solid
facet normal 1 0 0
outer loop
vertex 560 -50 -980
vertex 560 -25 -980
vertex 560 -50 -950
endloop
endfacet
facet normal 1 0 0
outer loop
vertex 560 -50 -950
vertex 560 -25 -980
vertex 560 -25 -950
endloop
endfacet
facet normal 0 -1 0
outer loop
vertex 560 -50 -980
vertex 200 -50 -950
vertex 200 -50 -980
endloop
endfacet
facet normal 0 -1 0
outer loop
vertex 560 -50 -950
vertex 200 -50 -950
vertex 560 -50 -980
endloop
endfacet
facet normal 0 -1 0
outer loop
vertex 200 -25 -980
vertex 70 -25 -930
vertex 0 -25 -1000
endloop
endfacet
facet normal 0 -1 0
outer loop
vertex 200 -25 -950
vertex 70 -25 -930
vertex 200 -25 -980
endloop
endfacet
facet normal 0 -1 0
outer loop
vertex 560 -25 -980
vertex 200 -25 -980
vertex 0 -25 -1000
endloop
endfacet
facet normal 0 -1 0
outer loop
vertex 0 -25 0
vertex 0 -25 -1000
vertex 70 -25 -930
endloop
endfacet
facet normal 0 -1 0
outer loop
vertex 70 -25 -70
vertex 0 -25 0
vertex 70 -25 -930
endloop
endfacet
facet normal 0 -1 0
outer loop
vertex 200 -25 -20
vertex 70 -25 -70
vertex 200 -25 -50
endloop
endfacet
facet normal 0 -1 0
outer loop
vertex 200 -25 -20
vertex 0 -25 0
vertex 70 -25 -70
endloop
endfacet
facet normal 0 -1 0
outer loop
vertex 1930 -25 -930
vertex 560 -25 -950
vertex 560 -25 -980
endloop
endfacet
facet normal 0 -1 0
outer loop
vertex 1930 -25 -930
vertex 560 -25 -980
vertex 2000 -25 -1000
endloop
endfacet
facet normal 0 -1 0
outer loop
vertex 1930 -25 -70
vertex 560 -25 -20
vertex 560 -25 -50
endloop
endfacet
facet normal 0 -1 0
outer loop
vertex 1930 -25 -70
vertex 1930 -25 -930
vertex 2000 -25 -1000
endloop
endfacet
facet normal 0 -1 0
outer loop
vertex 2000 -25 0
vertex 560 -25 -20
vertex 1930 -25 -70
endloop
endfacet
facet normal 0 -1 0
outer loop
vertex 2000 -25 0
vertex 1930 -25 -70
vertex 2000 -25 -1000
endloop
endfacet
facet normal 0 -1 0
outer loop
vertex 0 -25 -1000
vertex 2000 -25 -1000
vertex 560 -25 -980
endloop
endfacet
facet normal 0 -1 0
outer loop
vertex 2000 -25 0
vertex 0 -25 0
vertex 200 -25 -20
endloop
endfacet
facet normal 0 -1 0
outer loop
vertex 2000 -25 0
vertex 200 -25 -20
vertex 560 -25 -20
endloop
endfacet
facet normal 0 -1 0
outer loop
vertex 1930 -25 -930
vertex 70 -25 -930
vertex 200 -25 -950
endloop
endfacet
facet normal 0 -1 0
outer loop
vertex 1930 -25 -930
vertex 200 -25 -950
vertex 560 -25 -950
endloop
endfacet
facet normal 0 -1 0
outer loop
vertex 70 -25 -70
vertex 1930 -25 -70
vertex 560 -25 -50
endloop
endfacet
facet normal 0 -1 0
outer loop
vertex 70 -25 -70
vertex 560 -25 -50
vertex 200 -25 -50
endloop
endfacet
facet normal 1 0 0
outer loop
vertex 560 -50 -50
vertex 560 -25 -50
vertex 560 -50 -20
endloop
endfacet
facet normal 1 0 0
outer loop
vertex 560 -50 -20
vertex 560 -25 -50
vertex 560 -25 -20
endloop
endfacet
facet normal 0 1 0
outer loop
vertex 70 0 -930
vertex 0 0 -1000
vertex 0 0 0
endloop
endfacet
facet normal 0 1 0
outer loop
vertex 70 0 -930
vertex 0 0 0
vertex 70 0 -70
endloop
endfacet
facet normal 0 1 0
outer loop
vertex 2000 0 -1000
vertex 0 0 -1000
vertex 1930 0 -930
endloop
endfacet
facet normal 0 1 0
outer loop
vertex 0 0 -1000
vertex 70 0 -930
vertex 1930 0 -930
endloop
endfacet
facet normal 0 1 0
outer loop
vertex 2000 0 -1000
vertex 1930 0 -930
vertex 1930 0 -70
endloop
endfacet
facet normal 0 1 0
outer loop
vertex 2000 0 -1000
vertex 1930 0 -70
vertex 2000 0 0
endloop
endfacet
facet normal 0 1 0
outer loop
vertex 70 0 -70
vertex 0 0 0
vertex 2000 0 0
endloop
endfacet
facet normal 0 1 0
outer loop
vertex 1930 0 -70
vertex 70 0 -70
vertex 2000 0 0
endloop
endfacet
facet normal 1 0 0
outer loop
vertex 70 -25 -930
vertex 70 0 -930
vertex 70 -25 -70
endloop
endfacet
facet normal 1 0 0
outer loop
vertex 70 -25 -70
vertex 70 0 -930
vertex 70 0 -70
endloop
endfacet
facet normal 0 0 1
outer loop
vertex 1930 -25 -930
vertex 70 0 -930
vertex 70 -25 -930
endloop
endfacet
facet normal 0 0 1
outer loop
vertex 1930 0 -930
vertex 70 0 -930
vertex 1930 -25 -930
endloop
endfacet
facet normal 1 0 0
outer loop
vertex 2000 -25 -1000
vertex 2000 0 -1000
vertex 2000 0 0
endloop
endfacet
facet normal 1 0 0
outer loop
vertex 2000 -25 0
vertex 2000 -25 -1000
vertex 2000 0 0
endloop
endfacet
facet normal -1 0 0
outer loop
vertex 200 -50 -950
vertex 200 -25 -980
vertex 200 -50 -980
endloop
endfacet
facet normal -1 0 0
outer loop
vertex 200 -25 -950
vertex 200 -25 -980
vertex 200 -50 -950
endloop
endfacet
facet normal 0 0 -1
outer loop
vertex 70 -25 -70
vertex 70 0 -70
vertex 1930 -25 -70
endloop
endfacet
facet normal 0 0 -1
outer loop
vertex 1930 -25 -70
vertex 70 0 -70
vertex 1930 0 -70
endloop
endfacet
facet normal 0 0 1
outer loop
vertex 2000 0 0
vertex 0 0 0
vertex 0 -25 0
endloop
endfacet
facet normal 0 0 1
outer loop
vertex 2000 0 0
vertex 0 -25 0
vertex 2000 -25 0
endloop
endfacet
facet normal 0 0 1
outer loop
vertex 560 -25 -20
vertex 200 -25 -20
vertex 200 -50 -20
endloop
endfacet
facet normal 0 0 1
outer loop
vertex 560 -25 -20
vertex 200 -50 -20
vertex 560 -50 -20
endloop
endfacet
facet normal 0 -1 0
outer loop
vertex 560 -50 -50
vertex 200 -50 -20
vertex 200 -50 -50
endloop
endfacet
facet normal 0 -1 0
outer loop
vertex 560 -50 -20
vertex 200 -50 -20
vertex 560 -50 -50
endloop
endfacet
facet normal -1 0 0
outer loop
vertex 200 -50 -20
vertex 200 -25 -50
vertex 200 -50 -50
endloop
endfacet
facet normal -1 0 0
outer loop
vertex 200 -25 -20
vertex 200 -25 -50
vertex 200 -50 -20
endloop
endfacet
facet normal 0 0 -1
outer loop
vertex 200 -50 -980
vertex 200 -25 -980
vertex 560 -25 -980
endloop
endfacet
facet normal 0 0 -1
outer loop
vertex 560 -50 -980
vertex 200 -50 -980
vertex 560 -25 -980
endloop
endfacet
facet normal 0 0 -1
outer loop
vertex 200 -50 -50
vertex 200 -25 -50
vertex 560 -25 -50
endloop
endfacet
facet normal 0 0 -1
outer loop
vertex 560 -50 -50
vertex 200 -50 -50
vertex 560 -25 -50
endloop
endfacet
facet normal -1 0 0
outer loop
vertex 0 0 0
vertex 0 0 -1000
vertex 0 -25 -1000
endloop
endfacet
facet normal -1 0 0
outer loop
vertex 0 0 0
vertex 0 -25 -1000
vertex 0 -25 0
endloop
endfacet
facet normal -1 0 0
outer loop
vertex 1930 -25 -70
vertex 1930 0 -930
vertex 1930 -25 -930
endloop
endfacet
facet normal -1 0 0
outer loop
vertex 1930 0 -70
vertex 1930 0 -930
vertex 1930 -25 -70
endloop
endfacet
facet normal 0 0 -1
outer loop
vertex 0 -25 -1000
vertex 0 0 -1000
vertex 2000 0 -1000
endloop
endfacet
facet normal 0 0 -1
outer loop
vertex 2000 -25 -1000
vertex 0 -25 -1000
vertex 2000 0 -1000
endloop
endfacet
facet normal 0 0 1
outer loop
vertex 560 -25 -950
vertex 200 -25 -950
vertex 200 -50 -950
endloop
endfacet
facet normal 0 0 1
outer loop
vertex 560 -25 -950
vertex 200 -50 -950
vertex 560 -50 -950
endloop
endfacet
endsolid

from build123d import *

# Parameters (mm, degrees)
F0_W     = 2000
F0_H     = 1000
F0_W_2   = 1860
F0_H_2   = 860
F1_DEPTH = 25
F2_W     = 360
F2_H     = 30
F3_DEPTH = 25


with BuildPart() as f1:
    # F0 (on Front) → F1 (new body)
    with BuildSketch(Plane.XZ):
        with Locations((1000, -500)):
            Rectangle(F0_W, F0_H)
        with Locations((1000, -500)):
            Rectangle(F0_W_2, F0_H_2, mode=Mode.SUBTRACT)
    extrude(amount=F1_DEPTH)

    # F2 (on face) → F3 (join)
    with BuildSketch(Plane.XZ.offset(25)):
        with Locations((380, -35)):
            Rectangle(F2_W, F2_H)
        with Locations((380, -965)):
            Rectangle(F2_W, F2_H)
    extrude(amount=F3_DEPTH)


solid = f1.part
